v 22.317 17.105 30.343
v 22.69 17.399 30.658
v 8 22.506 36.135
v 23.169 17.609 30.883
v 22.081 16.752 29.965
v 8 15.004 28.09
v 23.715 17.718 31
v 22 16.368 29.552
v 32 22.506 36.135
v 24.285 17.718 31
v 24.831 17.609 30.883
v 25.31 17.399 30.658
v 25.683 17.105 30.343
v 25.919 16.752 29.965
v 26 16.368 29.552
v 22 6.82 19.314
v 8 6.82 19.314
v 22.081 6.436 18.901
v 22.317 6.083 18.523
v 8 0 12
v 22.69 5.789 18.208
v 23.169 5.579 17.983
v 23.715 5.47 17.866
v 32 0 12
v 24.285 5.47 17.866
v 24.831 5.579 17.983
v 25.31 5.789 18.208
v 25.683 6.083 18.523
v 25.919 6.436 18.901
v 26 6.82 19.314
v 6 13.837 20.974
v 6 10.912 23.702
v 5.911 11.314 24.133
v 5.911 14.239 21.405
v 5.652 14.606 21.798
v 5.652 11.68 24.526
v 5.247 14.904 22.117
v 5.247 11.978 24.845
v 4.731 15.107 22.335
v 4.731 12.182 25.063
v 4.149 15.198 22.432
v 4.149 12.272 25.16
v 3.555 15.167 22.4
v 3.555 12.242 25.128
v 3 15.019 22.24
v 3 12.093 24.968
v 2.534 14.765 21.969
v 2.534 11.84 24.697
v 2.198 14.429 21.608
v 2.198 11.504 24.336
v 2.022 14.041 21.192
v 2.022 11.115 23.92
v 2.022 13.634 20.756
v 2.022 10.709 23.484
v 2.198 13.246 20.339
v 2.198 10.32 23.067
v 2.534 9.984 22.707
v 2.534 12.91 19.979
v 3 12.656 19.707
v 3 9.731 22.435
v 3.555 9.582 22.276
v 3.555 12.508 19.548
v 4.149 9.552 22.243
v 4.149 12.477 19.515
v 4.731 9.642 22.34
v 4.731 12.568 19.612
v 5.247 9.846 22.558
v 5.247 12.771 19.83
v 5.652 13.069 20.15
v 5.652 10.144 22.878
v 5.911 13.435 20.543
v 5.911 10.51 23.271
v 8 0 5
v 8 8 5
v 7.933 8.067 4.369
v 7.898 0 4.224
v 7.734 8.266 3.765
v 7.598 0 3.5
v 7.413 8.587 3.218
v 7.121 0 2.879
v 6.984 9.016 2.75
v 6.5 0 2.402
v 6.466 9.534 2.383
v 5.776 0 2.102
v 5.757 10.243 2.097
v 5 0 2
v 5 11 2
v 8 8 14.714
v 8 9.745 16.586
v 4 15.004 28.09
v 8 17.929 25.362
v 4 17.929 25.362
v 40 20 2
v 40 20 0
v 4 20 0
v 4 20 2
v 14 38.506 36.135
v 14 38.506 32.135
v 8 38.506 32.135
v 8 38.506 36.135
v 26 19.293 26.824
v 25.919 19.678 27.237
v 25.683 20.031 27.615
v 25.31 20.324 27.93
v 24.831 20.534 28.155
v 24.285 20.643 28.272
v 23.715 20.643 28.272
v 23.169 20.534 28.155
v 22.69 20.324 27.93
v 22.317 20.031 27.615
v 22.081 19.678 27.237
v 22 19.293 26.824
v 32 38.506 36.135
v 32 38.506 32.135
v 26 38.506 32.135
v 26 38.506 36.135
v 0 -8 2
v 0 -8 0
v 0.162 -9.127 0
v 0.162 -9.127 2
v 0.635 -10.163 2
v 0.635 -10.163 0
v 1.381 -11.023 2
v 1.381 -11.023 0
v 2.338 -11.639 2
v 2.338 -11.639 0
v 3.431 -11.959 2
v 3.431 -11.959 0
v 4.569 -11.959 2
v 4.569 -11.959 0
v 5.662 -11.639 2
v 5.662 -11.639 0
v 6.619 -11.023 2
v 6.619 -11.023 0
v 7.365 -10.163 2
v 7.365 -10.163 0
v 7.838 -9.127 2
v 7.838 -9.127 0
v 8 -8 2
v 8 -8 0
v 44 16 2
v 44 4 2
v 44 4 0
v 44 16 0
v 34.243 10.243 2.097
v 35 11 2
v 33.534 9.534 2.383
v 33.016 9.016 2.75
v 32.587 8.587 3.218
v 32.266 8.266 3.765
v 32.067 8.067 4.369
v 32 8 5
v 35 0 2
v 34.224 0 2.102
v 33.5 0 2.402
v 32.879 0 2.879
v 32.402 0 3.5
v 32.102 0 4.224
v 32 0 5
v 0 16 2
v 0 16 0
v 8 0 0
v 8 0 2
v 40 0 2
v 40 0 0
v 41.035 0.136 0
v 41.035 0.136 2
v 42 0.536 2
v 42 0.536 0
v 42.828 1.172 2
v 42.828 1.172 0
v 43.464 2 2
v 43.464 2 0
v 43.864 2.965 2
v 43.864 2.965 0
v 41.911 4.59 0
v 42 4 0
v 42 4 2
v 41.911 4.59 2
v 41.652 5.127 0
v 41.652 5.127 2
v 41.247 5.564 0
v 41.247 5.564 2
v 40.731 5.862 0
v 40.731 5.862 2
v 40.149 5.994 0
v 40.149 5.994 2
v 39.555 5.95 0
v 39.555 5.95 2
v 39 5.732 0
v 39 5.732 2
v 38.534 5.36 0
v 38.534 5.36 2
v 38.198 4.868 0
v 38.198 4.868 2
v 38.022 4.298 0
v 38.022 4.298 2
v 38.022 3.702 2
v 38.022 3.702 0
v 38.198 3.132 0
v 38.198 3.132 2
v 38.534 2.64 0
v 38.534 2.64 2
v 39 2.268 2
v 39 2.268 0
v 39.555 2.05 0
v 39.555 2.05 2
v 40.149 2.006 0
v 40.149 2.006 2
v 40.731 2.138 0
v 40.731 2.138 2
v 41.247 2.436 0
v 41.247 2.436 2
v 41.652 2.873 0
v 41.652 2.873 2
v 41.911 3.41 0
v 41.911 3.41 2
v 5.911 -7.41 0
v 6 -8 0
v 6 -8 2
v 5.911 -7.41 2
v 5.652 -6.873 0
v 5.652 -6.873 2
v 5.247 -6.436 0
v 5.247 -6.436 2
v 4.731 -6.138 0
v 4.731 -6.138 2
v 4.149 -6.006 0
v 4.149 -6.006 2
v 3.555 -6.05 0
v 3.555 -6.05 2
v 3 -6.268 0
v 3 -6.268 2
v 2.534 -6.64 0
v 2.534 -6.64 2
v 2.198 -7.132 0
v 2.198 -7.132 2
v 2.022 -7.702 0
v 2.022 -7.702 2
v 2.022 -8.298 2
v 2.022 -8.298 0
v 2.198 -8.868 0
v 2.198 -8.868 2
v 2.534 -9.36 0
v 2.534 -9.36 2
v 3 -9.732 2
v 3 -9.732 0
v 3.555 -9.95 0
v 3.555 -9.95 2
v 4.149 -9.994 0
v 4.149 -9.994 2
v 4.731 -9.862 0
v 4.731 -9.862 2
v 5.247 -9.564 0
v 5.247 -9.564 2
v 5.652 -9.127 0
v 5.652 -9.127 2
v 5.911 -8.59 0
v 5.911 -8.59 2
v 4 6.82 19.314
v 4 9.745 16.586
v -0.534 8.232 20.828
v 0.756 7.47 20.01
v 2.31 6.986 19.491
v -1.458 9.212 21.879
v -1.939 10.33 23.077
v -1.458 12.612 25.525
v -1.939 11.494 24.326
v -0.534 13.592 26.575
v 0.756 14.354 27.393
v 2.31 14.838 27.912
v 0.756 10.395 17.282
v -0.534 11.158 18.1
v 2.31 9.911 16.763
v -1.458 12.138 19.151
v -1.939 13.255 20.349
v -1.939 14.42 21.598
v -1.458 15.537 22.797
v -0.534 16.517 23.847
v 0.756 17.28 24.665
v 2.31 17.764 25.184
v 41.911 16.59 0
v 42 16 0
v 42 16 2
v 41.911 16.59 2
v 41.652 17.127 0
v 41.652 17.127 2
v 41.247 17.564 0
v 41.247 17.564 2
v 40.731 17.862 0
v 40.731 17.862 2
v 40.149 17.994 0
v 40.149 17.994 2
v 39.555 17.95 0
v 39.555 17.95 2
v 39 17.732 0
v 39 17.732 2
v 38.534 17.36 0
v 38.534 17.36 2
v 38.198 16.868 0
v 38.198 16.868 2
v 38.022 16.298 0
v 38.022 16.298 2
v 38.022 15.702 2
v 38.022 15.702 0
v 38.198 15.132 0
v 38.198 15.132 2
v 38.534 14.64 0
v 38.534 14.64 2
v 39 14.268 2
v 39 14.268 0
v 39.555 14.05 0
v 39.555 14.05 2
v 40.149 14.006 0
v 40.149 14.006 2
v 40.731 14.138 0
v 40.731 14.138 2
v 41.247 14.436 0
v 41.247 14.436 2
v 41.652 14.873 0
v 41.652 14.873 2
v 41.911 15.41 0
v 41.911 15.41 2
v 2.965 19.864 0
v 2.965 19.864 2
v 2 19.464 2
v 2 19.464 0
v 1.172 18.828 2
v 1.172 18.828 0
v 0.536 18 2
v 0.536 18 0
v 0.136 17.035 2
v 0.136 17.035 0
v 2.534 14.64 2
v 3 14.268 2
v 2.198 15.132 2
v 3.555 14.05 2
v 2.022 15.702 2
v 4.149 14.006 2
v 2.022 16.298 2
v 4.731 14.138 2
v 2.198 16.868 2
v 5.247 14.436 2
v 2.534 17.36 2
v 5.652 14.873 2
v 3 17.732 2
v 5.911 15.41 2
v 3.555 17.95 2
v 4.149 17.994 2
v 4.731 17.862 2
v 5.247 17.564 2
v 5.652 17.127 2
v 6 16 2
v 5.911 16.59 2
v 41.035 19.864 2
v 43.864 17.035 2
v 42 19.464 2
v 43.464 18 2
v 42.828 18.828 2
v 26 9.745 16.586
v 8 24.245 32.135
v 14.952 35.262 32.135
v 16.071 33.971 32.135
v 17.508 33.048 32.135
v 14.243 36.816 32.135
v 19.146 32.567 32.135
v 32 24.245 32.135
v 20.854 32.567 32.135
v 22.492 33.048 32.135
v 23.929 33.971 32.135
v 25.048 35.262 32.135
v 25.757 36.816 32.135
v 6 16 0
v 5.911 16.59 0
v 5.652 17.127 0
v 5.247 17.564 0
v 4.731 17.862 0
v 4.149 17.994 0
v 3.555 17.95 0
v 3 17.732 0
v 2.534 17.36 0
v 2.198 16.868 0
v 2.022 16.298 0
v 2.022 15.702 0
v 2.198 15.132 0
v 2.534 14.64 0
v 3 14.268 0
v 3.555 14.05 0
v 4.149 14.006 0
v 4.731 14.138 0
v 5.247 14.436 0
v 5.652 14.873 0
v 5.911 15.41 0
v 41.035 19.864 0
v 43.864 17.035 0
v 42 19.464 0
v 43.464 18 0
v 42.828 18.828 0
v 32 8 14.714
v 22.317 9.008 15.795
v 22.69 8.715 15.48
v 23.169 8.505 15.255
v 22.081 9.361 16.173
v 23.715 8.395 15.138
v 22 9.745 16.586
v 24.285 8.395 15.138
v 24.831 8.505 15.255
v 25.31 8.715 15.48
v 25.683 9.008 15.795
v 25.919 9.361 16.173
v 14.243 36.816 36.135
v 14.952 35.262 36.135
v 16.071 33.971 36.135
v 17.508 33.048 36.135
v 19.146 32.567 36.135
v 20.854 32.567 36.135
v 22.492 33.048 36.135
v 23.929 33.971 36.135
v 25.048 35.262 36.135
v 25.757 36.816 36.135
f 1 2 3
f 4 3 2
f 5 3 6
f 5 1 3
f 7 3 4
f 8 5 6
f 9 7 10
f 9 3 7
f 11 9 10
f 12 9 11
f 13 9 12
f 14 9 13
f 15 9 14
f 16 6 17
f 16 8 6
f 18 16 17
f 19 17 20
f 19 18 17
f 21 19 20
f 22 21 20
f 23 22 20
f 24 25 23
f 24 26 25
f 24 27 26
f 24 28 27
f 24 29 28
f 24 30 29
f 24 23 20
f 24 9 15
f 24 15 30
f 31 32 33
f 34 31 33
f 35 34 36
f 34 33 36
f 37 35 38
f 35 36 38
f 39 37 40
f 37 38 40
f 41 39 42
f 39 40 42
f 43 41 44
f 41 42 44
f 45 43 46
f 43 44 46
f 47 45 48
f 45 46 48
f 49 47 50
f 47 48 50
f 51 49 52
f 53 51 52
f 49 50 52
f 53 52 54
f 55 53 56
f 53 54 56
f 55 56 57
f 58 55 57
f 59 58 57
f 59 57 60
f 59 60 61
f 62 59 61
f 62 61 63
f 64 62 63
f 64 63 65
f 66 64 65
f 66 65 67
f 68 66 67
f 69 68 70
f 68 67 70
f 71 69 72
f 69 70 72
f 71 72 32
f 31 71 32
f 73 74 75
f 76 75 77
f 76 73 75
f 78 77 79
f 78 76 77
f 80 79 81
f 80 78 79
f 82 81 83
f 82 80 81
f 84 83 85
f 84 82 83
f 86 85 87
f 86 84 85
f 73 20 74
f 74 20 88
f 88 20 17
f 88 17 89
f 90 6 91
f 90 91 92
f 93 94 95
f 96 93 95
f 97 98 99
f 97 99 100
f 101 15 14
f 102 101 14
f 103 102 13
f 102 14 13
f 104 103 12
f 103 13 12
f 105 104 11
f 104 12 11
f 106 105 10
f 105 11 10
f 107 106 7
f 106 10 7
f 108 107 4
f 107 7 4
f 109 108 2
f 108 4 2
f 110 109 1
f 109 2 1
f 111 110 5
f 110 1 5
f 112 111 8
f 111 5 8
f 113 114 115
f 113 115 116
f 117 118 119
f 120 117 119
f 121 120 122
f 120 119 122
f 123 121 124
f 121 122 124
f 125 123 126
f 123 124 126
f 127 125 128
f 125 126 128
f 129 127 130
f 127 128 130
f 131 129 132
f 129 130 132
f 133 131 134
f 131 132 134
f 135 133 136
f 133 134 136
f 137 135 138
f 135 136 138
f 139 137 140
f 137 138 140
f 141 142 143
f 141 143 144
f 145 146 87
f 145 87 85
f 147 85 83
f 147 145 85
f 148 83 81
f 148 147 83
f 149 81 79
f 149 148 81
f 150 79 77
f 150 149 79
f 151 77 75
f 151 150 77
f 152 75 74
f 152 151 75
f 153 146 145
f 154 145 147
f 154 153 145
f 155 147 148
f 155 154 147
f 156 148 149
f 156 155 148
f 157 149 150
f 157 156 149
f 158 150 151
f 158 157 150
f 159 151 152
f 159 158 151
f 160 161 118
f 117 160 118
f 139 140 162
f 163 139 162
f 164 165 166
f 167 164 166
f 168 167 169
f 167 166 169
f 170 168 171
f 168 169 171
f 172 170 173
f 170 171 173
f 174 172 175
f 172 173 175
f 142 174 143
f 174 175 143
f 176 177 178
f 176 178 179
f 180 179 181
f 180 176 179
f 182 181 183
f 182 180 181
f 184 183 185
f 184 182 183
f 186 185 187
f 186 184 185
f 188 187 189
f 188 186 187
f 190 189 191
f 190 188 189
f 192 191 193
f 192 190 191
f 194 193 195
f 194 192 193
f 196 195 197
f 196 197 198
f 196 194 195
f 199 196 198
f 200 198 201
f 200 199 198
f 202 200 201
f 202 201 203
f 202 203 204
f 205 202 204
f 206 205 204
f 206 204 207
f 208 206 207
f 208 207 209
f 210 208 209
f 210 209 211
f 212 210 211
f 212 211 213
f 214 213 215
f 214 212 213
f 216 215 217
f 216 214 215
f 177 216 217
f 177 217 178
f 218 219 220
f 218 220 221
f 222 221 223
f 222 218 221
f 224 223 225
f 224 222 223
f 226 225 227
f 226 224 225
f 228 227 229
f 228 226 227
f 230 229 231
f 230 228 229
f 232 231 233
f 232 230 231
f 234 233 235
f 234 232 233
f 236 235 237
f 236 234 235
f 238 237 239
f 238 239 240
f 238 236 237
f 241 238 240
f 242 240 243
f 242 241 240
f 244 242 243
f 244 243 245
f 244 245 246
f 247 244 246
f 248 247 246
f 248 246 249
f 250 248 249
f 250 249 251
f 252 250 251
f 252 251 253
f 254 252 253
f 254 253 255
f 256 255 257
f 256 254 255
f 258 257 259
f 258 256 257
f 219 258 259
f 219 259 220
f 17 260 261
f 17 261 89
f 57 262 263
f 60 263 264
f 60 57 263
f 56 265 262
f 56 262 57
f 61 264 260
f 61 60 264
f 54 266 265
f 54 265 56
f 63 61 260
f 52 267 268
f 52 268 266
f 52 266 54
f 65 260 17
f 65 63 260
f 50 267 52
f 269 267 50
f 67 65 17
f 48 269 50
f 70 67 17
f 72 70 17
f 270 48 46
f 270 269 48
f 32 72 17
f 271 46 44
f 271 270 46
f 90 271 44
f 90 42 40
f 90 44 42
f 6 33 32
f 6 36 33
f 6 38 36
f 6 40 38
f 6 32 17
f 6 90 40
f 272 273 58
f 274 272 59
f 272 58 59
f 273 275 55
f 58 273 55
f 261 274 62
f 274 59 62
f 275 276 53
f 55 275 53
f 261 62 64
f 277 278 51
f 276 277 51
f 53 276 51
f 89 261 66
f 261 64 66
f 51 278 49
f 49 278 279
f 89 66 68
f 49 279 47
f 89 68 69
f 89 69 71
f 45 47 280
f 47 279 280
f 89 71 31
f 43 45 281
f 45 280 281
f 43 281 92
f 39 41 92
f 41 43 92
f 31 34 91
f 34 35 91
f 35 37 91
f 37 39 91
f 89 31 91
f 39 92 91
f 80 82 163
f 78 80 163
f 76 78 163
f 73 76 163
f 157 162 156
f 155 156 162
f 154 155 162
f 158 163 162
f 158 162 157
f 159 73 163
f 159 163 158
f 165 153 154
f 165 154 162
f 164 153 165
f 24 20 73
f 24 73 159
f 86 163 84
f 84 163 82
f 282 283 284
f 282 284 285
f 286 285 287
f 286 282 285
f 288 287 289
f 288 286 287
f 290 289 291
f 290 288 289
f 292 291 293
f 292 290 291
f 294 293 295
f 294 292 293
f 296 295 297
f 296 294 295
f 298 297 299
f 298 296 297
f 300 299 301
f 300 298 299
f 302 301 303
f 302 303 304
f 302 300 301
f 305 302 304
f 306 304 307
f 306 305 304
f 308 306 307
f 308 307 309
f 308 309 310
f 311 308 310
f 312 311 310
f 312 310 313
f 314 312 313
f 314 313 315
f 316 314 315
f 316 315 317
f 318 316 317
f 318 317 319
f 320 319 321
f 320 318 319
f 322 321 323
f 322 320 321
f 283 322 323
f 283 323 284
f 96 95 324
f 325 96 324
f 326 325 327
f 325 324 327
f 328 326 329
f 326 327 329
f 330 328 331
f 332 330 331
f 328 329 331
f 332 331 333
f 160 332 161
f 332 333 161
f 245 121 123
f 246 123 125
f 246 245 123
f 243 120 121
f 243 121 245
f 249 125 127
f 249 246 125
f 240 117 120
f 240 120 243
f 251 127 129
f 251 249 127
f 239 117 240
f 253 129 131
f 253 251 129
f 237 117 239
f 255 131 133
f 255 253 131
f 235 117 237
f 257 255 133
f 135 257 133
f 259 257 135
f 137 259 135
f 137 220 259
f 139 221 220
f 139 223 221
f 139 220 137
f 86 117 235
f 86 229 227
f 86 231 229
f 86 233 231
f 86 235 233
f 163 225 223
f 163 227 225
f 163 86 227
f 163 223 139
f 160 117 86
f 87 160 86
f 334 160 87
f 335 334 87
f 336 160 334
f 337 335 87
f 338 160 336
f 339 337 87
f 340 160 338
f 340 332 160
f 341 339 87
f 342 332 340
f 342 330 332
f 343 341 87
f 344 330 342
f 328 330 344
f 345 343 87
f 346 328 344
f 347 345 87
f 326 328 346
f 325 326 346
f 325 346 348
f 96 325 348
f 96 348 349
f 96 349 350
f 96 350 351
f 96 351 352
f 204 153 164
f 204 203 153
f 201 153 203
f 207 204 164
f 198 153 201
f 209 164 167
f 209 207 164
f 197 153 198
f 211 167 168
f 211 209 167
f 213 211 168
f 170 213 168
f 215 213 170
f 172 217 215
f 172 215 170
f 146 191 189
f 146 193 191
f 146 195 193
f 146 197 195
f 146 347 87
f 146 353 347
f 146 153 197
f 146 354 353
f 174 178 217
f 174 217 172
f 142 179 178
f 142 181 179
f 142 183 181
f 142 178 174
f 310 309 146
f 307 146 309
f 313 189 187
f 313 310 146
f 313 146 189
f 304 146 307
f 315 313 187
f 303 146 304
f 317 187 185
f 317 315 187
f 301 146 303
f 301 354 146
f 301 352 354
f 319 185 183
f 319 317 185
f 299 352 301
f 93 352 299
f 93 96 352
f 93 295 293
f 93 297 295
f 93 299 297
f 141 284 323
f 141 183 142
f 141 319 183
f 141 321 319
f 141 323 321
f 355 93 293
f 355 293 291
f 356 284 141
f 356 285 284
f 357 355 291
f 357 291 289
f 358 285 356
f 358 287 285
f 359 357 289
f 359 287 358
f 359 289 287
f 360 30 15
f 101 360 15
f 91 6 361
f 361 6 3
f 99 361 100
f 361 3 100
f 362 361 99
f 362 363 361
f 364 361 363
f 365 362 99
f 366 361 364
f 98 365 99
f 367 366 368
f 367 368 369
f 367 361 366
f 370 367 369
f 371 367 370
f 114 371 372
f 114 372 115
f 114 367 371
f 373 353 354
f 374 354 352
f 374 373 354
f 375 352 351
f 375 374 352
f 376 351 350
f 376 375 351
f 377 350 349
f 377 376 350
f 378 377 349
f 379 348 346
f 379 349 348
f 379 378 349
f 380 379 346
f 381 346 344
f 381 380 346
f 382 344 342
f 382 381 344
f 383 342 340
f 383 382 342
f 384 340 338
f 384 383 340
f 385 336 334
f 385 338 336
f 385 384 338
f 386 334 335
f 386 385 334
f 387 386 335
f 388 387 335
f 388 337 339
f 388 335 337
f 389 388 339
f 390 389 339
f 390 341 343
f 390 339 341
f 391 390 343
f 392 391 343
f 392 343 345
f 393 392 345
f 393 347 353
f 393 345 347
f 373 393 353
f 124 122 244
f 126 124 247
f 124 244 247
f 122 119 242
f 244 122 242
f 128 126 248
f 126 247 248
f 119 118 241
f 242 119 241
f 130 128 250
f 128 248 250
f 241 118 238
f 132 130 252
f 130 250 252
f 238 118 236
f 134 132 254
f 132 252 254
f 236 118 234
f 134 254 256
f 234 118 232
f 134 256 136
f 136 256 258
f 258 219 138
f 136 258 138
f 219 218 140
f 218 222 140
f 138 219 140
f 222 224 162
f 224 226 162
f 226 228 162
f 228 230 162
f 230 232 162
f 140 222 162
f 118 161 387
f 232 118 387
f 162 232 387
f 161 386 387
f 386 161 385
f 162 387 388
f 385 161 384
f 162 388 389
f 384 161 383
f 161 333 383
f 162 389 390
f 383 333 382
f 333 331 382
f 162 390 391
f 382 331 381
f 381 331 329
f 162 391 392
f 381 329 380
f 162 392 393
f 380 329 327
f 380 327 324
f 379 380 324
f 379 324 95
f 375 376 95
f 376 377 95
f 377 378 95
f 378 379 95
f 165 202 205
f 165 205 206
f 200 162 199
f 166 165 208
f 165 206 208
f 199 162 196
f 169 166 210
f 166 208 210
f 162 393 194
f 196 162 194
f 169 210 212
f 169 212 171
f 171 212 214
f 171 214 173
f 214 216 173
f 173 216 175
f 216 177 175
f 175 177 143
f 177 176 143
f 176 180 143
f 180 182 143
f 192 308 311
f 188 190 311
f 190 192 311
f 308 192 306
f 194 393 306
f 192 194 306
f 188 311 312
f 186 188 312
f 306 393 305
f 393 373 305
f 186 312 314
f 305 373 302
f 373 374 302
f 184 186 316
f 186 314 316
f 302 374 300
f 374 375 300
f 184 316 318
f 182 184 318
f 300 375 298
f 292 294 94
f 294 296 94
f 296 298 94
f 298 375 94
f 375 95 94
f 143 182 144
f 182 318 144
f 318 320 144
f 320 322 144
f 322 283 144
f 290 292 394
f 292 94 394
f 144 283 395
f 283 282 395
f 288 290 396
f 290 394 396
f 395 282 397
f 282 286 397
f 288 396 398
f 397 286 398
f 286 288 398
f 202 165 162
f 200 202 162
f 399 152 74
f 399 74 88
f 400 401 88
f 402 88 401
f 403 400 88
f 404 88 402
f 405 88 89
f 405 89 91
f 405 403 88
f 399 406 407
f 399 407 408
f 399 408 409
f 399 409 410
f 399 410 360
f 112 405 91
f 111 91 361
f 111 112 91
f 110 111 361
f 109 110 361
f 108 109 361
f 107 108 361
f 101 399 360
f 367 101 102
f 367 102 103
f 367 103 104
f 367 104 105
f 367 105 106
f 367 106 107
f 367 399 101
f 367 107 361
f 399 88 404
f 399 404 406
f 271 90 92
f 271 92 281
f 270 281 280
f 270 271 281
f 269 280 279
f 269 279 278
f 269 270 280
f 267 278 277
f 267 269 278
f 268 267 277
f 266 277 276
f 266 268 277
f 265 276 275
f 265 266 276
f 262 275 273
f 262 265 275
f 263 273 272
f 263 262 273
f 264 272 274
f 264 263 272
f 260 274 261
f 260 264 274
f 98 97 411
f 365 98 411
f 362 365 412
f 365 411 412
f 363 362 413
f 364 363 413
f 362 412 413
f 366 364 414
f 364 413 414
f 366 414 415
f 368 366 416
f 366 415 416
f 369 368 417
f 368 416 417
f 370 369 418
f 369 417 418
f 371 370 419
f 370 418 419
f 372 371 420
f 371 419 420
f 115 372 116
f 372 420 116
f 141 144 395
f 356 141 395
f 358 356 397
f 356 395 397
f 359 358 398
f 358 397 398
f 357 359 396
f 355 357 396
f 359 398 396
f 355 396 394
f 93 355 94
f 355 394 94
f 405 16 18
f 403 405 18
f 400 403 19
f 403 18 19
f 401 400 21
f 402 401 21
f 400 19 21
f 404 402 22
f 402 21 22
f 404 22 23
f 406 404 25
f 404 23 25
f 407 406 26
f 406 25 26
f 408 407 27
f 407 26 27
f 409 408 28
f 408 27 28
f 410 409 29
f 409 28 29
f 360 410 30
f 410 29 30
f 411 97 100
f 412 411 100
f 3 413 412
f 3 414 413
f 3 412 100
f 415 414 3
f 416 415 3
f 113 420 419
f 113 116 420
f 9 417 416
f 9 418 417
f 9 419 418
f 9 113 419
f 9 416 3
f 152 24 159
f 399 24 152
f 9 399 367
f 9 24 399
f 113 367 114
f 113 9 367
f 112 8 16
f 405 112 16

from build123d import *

# Parameters (mm, degrees)
F0_R      = 2
F1_DEPTH  = 2
F2_W      = 24
F2_H      = 8
F3_DEPTH  = 10
F5_DEPTH  = 8
F7_DEPTH  = 40
F9_DEPTH  = 25
F11_DEPTH = 24
F13_DEPTH = 4
F14_R     = 2
F15_DEPTH = 4
F17_DEPTH = 4


with BuildPart() as f1:
    # F0 (on Top) → F1 (new body)
    with BuildSketch(Plane.XY):
        with BuildLine():
            Line((40, 20), (4, 20))
            ThreePointArc((4, 20), (1.1715728753, 18.8284271247), (0, 16))
            Line((0, 16), (0, -8))
            ThreePointArc((0, -8), (4, -12), (8, -8))
            Line((8, -8), (8, 0))
            Line((8, 0), (40, 0))
            ThreePointArc((40, 0), (42.8284271247, 1.1715728753), (44, 4))
            Line((44, 4), (44, 16))
            ThreePointArc((44, 16), (42.8284271247, 18.8284271247), (40, 20))
        make_face()
        with Locations((4, -8)):
            Circle(F0_R, mode=Mode.SUBTRACT)
        with Locations((4, 16)):
            Circle(F0_R, mode=Mode.SUBTRACT)
        with Locations((40, 4)):
            Circle(F0_R, mode=Mode.SUBTRACT)
        with Locations((40, 16)):
            Circle(F0_R, mode=Mode.SUBTRACT)
    extrude(amount=F1_DEPTH)

    # F2 (on face) → F3 (join)
    with BuildSketch(Plane.XY.offset(2)):
        with Locations((20, 4)):
            Rectangle(F2_W, F2_H)
    extrude(amount=F3_DEPTH)

    # F4 (on face) → F5 (join)
    with BuildSketch(Plane.XZ):
        with BuildLine():
            Line((32, 2), (35, 2))
            ThreePointArc((35, 2), (32.8786796564, 2.8786796564), (32, 5))
            Line((32, 5), (32, 2))
        make_face()
        with BuildLine():
            Line((5, 2), (8, 2))
            Line((8, 2), (8, 5))
            ThreePointArc((8, 5), (7.1213203436, 2.8786796564), (5, 2))
        make_face()
    extrude(amount=-F5_DEPTH)

    # F6 (on face) → F7 (join)
    with BuildSketch(Plane.YZ.offset(44)):
        with BuildLine():
            ThreePointArc((11, 2), (8.8786796564, 2.8786796564), (8, 5))
            Line((8, 5), (8, 2))
            Line((8, 2), (11, 2))
        make_face()
    extrude(amount=-F7_DEPTH)

    # F8 (on face) → F9 (cut)
    with BuildSketch(Plane.XZ):
        with BuildLine():
            ThreePointArc((5, 2), (7.1213203436, 2.8786796564), (8, 5))
            Line((8, 5), (3.8540177047, 5))
            Line((3.8540177047, 5), (3.8540177047, 2))
            Line((3.8540177047, 2), (5, 2))
        make_face()
        with BuildLine():
            Line((44, 5), (32, 5))
            ThreePointArc((32, 5), (32.8786796564, 2.8786796564), (35, 2))
            Line((35, 2), (40, 2))
            Line((40, 2), (44, 2))
            Line((44, 2), (44, 5))
        make_face()
    extrude(amount=-F9_DEPTH, mode=Mode.SUBTRACT)

    # F10 (on face) → F11 (join)
    with BuildSketch(Plane.YZ.offset(32)):
        Polygon((22.5059458821, 36.1346721534), (0, 12), (8, 12), (8, 14.7138329376), (24.2451953819, 32.1346721534), (38.5059458821, 32.1346721534), (38.5059458821, 36.1346721534), align=None)
    extrude(amount=-F11_DEPTH)

    # F12 (on face) → F13 (cut)
    with BuildSketch(Plane(origin=(0, -5.9853843016, 5.5814611575), x_dir=(1, 0, 0), z_dir=(0, -0.7313537016, 0.6819983601))):
        with BuildLine():
            Line((26, 18.7762444194), (26, 32.7762444194))
            ThreePointArc((26, 32.7762444194), (24, 34.7762444194), (22, 32.7762444194))
            Line((22, 32.7762444194), (22, 18.7762444194))
            ThreePointArc((22, 18.7762444194), (24, 16.7762444194), (26, 18.7762444194))
        make_face()
    extrude(amount=-F13_DEPTH, mode=Mode.SUBTRACT)

    # F14 (on face) → F15 (join)
    with BuildSketch(Plane(origin=(0, -5.9853843016, 5.5814611575), x_dir=(1, 0, 0), z_dir=(0, -0.7313537016, 0.6819983601))):
        with BuildLine():
            Line((8, 30.7762444194), (4, 30.7762444194))
            ThreePointArc((4, 30.7762444194), (-2, 24.7762444194), (4, 18.7762444194))
            Line((4, 18.7762444194), (8, 18.7762444194))
            Line((8, 18.7762444194), (8, 30.7762444194))
        make_face()
        with Locations((4, 24.7762444194)):
            Circle(F14_R, mode=Mode.SUBTRACT)
    extrude(amount=-F15_DEPTH)

    # F16 (on face) → F17 (cut)
    with BuildSketch(Plane.XY.offset(36.1346721534)):
        with BuildLine():
            ThreePointArc((14, 38.5059458821), (20, 32.5059458821), (26, 38.5059458821))
            Line((26, 38.5059458821), (14, 38.5059458821))
        make_face()
    extrude(amount=-F17_DEPTH, mode=Mode.SUBTRACT)


solid = f1.part
